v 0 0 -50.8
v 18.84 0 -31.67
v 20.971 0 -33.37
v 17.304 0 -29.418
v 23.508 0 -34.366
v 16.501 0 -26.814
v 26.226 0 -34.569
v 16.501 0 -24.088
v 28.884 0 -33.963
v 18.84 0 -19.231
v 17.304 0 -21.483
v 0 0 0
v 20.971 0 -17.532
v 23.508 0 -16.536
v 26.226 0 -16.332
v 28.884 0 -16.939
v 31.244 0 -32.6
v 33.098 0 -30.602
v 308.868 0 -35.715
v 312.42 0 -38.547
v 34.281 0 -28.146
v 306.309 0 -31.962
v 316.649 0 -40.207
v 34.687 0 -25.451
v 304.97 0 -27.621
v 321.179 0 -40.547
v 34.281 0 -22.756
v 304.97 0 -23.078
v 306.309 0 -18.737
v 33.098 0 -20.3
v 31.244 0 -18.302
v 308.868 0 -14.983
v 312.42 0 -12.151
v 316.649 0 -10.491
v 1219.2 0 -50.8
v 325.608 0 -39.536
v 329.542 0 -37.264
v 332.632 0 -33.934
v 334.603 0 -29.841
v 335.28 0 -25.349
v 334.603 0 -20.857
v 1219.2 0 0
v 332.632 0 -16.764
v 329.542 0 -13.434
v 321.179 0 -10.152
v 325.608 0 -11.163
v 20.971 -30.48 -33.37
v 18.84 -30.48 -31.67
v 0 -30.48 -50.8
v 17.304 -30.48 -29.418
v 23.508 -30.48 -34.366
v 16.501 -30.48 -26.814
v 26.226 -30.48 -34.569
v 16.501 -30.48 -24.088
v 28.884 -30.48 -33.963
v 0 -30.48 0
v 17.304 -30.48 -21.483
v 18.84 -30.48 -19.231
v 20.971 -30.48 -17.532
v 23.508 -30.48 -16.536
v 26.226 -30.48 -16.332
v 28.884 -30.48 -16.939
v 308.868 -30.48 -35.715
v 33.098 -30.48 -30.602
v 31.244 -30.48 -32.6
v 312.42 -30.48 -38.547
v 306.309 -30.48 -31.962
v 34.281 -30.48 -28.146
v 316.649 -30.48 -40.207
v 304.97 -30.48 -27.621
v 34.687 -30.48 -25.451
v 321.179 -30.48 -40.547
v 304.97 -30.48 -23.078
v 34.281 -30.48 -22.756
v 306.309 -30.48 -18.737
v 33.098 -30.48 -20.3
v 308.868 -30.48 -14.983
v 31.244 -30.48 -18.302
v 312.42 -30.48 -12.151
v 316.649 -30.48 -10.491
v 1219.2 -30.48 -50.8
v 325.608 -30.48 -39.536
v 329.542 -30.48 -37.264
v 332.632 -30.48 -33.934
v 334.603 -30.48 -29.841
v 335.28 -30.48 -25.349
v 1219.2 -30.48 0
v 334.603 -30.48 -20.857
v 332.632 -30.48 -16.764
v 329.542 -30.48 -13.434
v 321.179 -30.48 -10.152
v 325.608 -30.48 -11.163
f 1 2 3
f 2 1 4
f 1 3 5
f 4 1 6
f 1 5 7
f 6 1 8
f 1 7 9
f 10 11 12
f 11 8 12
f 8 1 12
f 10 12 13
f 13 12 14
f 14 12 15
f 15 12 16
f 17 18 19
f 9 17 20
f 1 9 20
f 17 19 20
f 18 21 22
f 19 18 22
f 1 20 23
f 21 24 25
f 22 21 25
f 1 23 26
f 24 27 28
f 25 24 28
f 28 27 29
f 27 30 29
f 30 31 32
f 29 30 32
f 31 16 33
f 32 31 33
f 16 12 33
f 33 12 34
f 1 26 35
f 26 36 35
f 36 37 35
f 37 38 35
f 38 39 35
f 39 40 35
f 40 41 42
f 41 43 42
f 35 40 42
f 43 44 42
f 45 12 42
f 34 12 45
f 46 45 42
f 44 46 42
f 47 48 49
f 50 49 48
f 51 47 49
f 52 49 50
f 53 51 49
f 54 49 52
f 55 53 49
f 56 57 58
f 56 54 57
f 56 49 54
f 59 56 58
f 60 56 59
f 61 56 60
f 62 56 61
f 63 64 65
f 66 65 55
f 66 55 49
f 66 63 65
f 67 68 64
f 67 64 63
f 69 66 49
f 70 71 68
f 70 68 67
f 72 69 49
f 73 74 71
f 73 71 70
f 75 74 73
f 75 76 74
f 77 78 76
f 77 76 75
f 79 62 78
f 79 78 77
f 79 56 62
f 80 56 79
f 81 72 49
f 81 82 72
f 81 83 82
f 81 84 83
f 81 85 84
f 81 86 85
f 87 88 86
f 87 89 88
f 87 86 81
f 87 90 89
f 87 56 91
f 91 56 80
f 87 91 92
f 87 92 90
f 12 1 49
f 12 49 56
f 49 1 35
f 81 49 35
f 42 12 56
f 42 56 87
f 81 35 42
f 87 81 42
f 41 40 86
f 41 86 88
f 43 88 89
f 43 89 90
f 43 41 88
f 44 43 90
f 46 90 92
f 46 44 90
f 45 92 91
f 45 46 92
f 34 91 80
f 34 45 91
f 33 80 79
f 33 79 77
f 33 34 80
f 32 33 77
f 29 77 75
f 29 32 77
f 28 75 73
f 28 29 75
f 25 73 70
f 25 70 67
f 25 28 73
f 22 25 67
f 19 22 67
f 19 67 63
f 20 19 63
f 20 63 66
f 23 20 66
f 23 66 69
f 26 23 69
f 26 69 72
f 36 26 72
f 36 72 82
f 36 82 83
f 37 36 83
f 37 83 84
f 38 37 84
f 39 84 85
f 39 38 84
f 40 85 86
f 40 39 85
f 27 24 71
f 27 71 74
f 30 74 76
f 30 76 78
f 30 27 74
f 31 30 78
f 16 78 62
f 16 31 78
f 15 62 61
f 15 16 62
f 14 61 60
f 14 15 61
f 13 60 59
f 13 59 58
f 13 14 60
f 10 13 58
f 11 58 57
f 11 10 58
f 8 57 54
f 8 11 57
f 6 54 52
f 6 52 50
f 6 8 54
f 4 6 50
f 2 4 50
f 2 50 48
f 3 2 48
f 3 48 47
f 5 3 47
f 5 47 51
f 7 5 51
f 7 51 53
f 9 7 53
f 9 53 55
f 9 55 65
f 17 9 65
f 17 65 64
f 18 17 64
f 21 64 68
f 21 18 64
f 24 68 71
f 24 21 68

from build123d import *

# Parameters (mm, degrees)
F0_W     = 1219.2
F0_H     = 50.8
F0_R     = 9.144
F0_R_2   = 15.24
F1_DEPTH = 30.48
F2_DEPTH = 30.48
F3_DEPTH = 30.48
F4_DEPTH = 30.48


with BuildPart() as f1:
    # F0 (on Front) → F1 (new body)
    with BuildSketch(Plane.XZ):
        with Locations((609.6, -25.4)):
            Rectangle(F0_W, F0_H)
        with Locations((25.542894, -25.4508)):
            Circle(F0_R, mode=Mode.SUBTRACT)
        with Locations((320.04, -25.3492)):
            Circle(F0_R_2, mode=Mode.SUBTRACT)
    extrude(amount=F1_DEPTH)

    # F0 (on Front) → F2 (join)
    with BuildSketch(Plane.XZ):
        with Locations((609.6, -25.4)):
            Rectangle(F0_W, F0_H)
        with Locations((25.542894, -25.4508)):
            Circle(F0_R, mode=Mode.SUBTRACT)
        with Locations((320.04, -25.3492)):
            Circle(F0_R_2, mode=Mode.SUBTRACT)
    extrude(amount=F2_DEPTH)

    # F0 (on Front) → F3 (join)
    with BuildSketch(Plane.XZ):
        with Locations((609.6, -25.4)):
            Rectangle(F0_W, F0_H)
        with Locations((25.542894, -25.4508)):
            Circle(F0_R, mode=Mode.SUBTRACT)
        with Locations((320.04, -25.3492)):
            Circle(F0_R_2, mode=Mode.SUBTRACT)
    extrude(amount=F3_DEPTH)

    # F0 (on Front) → F4 (join)
    with BuildSketch(Plane.XZ):
        with Locations((609.6, -25.4)):
            Rectangle(F0_W, F0_H)
        with Locations((25.542894, -25.4508)):
            Circle(F0_R, mode=Mode.SUBTRACT)
        with Locations((320.04, -25.3492)):
            Circle(F0_R_2, mode=Mode.SUBTRACT)
    extrude(amount=F4_DEPTH)


solid = f1.part
